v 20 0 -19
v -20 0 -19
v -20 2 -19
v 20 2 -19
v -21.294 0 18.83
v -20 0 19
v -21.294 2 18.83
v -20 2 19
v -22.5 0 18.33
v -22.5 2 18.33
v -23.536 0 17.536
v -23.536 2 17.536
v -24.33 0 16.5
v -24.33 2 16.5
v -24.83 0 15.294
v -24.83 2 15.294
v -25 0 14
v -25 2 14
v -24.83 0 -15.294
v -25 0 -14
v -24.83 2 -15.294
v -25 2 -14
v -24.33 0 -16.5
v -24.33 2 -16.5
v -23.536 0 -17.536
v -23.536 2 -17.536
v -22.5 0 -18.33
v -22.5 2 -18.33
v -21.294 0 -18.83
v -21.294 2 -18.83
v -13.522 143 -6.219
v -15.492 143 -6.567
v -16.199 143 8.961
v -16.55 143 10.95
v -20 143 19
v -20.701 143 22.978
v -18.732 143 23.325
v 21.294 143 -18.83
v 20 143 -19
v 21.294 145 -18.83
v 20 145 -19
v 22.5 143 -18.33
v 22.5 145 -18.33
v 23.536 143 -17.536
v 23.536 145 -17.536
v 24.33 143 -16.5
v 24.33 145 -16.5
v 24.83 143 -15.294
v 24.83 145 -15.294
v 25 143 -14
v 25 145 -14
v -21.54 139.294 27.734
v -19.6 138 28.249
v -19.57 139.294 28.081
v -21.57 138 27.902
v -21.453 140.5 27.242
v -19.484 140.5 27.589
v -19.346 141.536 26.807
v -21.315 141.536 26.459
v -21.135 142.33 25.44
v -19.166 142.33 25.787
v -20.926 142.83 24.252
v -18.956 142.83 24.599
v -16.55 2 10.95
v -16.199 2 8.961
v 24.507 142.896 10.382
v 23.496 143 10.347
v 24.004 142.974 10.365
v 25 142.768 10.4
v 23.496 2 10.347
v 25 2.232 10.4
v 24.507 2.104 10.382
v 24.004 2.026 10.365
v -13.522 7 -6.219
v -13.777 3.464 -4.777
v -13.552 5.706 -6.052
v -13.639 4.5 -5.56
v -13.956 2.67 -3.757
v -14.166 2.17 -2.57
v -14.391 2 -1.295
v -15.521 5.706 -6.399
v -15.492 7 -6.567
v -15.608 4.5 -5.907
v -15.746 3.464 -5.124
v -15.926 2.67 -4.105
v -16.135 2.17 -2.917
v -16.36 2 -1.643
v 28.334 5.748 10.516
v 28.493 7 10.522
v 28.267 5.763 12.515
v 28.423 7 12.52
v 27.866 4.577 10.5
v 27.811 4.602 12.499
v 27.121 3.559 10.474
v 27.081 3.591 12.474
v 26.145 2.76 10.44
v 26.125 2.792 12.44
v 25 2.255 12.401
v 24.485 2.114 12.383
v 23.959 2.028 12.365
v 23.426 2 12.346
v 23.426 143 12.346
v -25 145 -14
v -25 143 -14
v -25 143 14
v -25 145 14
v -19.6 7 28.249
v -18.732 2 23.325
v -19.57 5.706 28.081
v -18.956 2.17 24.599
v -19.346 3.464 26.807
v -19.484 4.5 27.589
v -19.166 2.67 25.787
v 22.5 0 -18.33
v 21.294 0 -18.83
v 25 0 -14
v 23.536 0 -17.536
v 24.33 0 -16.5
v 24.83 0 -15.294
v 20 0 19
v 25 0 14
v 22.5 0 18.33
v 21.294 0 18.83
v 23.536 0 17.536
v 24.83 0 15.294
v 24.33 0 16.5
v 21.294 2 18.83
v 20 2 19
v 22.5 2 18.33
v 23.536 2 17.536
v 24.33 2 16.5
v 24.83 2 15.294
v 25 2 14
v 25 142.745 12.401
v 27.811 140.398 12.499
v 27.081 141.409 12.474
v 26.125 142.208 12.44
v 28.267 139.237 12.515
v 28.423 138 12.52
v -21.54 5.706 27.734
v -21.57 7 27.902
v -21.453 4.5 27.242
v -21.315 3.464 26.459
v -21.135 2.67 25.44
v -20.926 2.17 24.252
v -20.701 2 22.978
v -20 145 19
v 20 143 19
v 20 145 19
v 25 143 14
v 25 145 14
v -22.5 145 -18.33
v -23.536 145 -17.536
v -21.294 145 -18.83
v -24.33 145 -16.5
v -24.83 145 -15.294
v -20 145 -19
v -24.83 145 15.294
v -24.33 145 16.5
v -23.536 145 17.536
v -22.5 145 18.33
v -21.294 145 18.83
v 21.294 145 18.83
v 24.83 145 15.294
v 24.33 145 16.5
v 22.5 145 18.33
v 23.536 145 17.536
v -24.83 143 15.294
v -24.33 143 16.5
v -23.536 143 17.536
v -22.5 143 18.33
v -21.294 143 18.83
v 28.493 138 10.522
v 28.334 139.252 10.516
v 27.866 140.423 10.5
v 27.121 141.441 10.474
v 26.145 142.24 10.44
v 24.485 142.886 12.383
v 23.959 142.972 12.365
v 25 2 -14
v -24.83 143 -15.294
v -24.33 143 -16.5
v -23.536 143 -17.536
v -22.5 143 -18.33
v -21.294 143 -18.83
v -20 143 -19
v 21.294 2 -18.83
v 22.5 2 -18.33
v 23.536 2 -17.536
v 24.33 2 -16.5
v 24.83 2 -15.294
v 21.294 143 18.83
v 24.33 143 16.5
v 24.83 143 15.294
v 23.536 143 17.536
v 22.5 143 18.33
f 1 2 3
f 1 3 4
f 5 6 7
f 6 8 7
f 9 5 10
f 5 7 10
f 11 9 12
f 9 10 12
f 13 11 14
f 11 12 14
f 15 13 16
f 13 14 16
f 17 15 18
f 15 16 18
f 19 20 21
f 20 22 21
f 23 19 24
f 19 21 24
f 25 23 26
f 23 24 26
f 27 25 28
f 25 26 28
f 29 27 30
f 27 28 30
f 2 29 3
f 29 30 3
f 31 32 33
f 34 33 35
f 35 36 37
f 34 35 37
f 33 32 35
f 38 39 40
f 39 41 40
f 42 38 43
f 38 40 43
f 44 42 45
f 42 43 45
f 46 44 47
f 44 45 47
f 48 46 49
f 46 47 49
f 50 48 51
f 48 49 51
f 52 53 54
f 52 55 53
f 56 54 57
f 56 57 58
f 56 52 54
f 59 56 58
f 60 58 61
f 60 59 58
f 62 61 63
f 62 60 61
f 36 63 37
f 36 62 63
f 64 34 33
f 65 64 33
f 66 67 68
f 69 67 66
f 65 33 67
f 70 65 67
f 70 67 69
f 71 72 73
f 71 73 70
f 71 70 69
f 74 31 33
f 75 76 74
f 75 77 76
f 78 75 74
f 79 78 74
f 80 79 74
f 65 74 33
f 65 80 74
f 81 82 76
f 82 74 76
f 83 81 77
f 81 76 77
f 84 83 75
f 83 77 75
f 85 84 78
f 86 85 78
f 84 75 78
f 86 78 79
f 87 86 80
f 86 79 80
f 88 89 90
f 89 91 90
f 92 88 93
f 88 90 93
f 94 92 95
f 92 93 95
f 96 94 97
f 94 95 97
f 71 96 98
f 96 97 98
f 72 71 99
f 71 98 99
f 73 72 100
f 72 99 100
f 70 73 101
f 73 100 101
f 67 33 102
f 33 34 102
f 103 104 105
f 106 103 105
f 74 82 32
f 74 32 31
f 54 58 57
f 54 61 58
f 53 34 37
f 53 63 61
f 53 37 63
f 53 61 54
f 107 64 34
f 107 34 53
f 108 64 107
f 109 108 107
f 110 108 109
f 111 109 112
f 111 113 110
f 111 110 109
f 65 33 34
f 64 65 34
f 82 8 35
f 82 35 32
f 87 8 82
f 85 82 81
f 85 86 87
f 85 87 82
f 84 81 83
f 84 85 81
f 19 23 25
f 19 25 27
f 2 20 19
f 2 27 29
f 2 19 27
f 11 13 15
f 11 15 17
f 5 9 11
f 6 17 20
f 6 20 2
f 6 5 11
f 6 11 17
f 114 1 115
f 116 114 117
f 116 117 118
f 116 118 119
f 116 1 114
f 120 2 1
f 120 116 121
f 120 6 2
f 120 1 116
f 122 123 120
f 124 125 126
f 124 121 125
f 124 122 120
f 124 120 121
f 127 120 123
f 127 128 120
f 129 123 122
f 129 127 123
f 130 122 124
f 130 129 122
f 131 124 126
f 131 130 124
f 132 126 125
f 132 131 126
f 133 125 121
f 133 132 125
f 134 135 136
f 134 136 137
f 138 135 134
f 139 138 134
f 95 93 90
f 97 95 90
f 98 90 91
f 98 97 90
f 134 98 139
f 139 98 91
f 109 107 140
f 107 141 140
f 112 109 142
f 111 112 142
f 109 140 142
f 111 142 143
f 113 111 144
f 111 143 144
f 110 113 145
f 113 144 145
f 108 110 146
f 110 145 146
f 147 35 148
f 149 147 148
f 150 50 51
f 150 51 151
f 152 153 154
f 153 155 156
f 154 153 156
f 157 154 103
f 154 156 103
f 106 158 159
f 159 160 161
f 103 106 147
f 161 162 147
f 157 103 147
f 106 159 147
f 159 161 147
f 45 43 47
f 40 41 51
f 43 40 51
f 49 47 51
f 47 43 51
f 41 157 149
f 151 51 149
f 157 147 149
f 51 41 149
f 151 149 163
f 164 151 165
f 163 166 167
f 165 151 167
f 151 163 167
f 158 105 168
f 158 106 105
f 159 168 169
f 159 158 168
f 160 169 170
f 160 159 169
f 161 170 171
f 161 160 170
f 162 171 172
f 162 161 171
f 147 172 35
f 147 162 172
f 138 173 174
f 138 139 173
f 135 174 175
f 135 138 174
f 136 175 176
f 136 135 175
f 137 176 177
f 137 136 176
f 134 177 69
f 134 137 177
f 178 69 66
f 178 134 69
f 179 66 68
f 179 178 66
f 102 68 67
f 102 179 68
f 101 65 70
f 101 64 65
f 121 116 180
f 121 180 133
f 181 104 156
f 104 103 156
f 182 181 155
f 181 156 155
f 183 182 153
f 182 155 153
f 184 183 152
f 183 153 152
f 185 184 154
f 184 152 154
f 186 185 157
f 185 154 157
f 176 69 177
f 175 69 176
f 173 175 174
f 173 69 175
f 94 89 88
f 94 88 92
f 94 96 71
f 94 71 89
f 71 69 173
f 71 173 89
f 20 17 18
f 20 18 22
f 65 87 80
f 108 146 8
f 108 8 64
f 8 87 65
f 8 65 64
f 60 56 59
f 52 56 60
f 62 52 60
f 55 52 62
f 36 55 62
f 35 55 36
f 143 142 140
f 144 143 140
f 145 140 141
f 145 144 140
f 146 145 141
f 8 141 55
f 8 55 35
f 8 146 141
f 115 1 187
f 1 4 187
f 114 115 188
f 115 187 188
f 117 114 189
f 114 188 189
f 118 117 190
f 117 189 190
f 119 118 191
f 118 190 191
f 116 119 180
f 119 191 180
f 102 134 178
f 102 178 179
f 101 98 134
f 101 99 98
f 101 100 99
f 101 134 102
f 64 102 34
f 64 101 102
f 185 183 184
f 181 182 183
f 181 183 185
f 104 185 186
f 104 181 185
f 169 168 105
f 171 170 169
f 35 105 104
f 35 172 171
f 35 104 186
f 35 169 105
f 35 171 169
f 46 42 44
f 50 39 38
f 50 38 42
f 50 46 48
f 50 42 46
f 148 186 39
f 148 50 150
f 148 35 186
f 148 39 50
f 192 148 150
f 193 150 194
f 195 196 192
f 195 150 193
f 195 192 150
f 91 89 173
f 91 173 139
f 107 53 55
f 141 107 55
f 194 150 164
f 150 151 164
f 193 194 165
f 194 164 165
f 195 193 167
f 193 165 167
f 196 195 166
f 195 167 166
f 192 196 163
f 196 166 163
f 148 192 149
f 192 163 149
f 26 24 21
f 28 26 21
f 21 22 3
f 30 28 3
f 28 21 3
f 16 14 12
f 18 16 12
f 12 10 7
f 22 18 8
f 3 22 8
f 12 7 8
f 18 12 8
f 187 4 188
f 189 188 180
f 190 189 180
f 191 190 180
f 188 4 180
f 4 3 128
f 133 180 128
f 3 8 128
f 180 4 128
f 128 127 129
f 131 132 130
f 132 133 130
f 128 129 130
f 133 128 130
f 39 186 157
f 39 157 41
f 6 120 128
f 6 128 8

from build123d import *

# Parameters (mm, degrees)
F1_DEPTH  = 2
F2_START  = -143
F1_FACE_W = 50
F1_FACE_H = 38
F2_DEPTH  = 2
F3_START  = -2
F3_DEPTH  = 141
F4_START  = -2
F4_DEPTH  = 141
F5_R      = 5
F5_2_R    = 5
F5_3_R    = 5
F5_4_R    = 5


with BuildPart() as f1:
    # F0 (on Front) → F1 (new body)
    with BuildSketch(Plane.XZ):
        Polygon((-16.5497043093, 10.9499417435), (25, 12.4008893901), (25, 19), (-17.9691467762, 19), align=None)
        Polygon((-16.1989948739, 8.9609696983), (25, 10.3996703016), (25, 12.4008893901), (-16.5497043093, 10.9499417435), align=None)
        Polygon((-25, 19), (-25, -19), (25, -19), (25, 10.3996703016), (-16.1989948739, 8.9609696983), (-13.5222860803, -6.2194002193), (-15.4919015863, -6.5666965746), (-20, 19), align=None)
        Polygon((-17.9691467762, 19), (-20, 19), (-15.4919015863, -6.5666965746), (-13.5222860803, -6.2194002193), (-16.1989948739, 8.9609696983), (-16.4799053159, 8.9511600895), (-16.5497043093, 10.9499417435), align=None)
        Polygon((-16.4799053159, 8.9511600895), (-16.1989948739, 8.9609696983), (-16.5497043093, 10.9499417435), align=None)
    extrude(amount=-F1_DEPTH)

    # F5#2
    f5_2_edges = [f1.edges().sort_by_distance(p)[0] for p in [
        (-25, 1, 19),
        (25, 1, 19),
        (25, 1, -19),
        (-25, 1, -19),
    ]]
    fillet(f5_2_edges, radius=F5_2_R)


with BuildPart() as f2:
    # F1_face (on face) → F2 (new body)
    with BuildSketch(Plane.XZ.offset(F2_START)):
        Rectangle(F1_FACE_W, F1_FACE_H)
    extrude(amount=-F2_DEPTH)

    # F5#4
    f5_4_edges = [f2.edges().sort_by_distance(p)[0] for p in [
        (25, 144, -19),
        (-25, 144, -19),
        (-25, 144, 19),
        (25, 144, 19),
    ]]
    fillet(f5_4_edges, radius=F5_4_R)


with BuildPart() as f3:
    # F0 (on Front) → F3 (new body)
    with BuildSketch(Plane.XZ.offset(F3_START)):
        Polygon((-17.9691467762, 19), (-20, 19), (-15.4919015863, -6.5666965746), (-13.5222860803, -6.2194002193), (-16.1989948739, 8.9609696983), (-16.4799053159, 8.9511600895), (-16.5497043093, 10.9499417435), align=None)
        Polygon((-21.5695878046, 27.9015747808), (-20, 19), (-17.9691467762, 19), (-19.5999722986, 28.2488711361), align=None)
        Polygon((-16.4799053159, 8.9511600895), (-16.1989948739, 8.9609696983), (-16.5497043093, 10.9499417435), align=None)
    extrude(amount=-F3_DEPTH)

    # F5
    f5_edges = [f3.edges().sort_by_distance(p)[0] for p in [
        (-20.58478, 2, 28.075223),
        (-20.58478, 143, 28.075223),
        (-14.507094, 2, -6.393048),
    ]]
    fillet(f5_edges, radius=F5_R)


with BuildPart() as f4:
    # F0 (on Front) → F4 (new body)
    with BuildSketch(Plane.XZ.offset(F4_START)):
        Polygon((-16.1989948739, 8.9609696983), (25, 10.3996703016), (25, 12.4008893901), (-16.5497043093, 10.9499417435), align=None)
        Polygon((25, 12.4008893901), (25, 10.3996703016), (28.4926818999, 10.5216374411), (28.4228829065, 12.5204190951), align=None)
    extrude(amount=-F4_DEPTH)

    # F5#3
    f5_3_edges = [f4.edges().sort_by_distance(p)[0] for p in [
        (28.457782, 2, 11.521028),
        (28.457782, 143, 11.521028),
    ]]
    fillet(f5_3_edges, radius=F5_3_R)


solid = Compound([f1.part, f2.part, f3.part, f4.part])
